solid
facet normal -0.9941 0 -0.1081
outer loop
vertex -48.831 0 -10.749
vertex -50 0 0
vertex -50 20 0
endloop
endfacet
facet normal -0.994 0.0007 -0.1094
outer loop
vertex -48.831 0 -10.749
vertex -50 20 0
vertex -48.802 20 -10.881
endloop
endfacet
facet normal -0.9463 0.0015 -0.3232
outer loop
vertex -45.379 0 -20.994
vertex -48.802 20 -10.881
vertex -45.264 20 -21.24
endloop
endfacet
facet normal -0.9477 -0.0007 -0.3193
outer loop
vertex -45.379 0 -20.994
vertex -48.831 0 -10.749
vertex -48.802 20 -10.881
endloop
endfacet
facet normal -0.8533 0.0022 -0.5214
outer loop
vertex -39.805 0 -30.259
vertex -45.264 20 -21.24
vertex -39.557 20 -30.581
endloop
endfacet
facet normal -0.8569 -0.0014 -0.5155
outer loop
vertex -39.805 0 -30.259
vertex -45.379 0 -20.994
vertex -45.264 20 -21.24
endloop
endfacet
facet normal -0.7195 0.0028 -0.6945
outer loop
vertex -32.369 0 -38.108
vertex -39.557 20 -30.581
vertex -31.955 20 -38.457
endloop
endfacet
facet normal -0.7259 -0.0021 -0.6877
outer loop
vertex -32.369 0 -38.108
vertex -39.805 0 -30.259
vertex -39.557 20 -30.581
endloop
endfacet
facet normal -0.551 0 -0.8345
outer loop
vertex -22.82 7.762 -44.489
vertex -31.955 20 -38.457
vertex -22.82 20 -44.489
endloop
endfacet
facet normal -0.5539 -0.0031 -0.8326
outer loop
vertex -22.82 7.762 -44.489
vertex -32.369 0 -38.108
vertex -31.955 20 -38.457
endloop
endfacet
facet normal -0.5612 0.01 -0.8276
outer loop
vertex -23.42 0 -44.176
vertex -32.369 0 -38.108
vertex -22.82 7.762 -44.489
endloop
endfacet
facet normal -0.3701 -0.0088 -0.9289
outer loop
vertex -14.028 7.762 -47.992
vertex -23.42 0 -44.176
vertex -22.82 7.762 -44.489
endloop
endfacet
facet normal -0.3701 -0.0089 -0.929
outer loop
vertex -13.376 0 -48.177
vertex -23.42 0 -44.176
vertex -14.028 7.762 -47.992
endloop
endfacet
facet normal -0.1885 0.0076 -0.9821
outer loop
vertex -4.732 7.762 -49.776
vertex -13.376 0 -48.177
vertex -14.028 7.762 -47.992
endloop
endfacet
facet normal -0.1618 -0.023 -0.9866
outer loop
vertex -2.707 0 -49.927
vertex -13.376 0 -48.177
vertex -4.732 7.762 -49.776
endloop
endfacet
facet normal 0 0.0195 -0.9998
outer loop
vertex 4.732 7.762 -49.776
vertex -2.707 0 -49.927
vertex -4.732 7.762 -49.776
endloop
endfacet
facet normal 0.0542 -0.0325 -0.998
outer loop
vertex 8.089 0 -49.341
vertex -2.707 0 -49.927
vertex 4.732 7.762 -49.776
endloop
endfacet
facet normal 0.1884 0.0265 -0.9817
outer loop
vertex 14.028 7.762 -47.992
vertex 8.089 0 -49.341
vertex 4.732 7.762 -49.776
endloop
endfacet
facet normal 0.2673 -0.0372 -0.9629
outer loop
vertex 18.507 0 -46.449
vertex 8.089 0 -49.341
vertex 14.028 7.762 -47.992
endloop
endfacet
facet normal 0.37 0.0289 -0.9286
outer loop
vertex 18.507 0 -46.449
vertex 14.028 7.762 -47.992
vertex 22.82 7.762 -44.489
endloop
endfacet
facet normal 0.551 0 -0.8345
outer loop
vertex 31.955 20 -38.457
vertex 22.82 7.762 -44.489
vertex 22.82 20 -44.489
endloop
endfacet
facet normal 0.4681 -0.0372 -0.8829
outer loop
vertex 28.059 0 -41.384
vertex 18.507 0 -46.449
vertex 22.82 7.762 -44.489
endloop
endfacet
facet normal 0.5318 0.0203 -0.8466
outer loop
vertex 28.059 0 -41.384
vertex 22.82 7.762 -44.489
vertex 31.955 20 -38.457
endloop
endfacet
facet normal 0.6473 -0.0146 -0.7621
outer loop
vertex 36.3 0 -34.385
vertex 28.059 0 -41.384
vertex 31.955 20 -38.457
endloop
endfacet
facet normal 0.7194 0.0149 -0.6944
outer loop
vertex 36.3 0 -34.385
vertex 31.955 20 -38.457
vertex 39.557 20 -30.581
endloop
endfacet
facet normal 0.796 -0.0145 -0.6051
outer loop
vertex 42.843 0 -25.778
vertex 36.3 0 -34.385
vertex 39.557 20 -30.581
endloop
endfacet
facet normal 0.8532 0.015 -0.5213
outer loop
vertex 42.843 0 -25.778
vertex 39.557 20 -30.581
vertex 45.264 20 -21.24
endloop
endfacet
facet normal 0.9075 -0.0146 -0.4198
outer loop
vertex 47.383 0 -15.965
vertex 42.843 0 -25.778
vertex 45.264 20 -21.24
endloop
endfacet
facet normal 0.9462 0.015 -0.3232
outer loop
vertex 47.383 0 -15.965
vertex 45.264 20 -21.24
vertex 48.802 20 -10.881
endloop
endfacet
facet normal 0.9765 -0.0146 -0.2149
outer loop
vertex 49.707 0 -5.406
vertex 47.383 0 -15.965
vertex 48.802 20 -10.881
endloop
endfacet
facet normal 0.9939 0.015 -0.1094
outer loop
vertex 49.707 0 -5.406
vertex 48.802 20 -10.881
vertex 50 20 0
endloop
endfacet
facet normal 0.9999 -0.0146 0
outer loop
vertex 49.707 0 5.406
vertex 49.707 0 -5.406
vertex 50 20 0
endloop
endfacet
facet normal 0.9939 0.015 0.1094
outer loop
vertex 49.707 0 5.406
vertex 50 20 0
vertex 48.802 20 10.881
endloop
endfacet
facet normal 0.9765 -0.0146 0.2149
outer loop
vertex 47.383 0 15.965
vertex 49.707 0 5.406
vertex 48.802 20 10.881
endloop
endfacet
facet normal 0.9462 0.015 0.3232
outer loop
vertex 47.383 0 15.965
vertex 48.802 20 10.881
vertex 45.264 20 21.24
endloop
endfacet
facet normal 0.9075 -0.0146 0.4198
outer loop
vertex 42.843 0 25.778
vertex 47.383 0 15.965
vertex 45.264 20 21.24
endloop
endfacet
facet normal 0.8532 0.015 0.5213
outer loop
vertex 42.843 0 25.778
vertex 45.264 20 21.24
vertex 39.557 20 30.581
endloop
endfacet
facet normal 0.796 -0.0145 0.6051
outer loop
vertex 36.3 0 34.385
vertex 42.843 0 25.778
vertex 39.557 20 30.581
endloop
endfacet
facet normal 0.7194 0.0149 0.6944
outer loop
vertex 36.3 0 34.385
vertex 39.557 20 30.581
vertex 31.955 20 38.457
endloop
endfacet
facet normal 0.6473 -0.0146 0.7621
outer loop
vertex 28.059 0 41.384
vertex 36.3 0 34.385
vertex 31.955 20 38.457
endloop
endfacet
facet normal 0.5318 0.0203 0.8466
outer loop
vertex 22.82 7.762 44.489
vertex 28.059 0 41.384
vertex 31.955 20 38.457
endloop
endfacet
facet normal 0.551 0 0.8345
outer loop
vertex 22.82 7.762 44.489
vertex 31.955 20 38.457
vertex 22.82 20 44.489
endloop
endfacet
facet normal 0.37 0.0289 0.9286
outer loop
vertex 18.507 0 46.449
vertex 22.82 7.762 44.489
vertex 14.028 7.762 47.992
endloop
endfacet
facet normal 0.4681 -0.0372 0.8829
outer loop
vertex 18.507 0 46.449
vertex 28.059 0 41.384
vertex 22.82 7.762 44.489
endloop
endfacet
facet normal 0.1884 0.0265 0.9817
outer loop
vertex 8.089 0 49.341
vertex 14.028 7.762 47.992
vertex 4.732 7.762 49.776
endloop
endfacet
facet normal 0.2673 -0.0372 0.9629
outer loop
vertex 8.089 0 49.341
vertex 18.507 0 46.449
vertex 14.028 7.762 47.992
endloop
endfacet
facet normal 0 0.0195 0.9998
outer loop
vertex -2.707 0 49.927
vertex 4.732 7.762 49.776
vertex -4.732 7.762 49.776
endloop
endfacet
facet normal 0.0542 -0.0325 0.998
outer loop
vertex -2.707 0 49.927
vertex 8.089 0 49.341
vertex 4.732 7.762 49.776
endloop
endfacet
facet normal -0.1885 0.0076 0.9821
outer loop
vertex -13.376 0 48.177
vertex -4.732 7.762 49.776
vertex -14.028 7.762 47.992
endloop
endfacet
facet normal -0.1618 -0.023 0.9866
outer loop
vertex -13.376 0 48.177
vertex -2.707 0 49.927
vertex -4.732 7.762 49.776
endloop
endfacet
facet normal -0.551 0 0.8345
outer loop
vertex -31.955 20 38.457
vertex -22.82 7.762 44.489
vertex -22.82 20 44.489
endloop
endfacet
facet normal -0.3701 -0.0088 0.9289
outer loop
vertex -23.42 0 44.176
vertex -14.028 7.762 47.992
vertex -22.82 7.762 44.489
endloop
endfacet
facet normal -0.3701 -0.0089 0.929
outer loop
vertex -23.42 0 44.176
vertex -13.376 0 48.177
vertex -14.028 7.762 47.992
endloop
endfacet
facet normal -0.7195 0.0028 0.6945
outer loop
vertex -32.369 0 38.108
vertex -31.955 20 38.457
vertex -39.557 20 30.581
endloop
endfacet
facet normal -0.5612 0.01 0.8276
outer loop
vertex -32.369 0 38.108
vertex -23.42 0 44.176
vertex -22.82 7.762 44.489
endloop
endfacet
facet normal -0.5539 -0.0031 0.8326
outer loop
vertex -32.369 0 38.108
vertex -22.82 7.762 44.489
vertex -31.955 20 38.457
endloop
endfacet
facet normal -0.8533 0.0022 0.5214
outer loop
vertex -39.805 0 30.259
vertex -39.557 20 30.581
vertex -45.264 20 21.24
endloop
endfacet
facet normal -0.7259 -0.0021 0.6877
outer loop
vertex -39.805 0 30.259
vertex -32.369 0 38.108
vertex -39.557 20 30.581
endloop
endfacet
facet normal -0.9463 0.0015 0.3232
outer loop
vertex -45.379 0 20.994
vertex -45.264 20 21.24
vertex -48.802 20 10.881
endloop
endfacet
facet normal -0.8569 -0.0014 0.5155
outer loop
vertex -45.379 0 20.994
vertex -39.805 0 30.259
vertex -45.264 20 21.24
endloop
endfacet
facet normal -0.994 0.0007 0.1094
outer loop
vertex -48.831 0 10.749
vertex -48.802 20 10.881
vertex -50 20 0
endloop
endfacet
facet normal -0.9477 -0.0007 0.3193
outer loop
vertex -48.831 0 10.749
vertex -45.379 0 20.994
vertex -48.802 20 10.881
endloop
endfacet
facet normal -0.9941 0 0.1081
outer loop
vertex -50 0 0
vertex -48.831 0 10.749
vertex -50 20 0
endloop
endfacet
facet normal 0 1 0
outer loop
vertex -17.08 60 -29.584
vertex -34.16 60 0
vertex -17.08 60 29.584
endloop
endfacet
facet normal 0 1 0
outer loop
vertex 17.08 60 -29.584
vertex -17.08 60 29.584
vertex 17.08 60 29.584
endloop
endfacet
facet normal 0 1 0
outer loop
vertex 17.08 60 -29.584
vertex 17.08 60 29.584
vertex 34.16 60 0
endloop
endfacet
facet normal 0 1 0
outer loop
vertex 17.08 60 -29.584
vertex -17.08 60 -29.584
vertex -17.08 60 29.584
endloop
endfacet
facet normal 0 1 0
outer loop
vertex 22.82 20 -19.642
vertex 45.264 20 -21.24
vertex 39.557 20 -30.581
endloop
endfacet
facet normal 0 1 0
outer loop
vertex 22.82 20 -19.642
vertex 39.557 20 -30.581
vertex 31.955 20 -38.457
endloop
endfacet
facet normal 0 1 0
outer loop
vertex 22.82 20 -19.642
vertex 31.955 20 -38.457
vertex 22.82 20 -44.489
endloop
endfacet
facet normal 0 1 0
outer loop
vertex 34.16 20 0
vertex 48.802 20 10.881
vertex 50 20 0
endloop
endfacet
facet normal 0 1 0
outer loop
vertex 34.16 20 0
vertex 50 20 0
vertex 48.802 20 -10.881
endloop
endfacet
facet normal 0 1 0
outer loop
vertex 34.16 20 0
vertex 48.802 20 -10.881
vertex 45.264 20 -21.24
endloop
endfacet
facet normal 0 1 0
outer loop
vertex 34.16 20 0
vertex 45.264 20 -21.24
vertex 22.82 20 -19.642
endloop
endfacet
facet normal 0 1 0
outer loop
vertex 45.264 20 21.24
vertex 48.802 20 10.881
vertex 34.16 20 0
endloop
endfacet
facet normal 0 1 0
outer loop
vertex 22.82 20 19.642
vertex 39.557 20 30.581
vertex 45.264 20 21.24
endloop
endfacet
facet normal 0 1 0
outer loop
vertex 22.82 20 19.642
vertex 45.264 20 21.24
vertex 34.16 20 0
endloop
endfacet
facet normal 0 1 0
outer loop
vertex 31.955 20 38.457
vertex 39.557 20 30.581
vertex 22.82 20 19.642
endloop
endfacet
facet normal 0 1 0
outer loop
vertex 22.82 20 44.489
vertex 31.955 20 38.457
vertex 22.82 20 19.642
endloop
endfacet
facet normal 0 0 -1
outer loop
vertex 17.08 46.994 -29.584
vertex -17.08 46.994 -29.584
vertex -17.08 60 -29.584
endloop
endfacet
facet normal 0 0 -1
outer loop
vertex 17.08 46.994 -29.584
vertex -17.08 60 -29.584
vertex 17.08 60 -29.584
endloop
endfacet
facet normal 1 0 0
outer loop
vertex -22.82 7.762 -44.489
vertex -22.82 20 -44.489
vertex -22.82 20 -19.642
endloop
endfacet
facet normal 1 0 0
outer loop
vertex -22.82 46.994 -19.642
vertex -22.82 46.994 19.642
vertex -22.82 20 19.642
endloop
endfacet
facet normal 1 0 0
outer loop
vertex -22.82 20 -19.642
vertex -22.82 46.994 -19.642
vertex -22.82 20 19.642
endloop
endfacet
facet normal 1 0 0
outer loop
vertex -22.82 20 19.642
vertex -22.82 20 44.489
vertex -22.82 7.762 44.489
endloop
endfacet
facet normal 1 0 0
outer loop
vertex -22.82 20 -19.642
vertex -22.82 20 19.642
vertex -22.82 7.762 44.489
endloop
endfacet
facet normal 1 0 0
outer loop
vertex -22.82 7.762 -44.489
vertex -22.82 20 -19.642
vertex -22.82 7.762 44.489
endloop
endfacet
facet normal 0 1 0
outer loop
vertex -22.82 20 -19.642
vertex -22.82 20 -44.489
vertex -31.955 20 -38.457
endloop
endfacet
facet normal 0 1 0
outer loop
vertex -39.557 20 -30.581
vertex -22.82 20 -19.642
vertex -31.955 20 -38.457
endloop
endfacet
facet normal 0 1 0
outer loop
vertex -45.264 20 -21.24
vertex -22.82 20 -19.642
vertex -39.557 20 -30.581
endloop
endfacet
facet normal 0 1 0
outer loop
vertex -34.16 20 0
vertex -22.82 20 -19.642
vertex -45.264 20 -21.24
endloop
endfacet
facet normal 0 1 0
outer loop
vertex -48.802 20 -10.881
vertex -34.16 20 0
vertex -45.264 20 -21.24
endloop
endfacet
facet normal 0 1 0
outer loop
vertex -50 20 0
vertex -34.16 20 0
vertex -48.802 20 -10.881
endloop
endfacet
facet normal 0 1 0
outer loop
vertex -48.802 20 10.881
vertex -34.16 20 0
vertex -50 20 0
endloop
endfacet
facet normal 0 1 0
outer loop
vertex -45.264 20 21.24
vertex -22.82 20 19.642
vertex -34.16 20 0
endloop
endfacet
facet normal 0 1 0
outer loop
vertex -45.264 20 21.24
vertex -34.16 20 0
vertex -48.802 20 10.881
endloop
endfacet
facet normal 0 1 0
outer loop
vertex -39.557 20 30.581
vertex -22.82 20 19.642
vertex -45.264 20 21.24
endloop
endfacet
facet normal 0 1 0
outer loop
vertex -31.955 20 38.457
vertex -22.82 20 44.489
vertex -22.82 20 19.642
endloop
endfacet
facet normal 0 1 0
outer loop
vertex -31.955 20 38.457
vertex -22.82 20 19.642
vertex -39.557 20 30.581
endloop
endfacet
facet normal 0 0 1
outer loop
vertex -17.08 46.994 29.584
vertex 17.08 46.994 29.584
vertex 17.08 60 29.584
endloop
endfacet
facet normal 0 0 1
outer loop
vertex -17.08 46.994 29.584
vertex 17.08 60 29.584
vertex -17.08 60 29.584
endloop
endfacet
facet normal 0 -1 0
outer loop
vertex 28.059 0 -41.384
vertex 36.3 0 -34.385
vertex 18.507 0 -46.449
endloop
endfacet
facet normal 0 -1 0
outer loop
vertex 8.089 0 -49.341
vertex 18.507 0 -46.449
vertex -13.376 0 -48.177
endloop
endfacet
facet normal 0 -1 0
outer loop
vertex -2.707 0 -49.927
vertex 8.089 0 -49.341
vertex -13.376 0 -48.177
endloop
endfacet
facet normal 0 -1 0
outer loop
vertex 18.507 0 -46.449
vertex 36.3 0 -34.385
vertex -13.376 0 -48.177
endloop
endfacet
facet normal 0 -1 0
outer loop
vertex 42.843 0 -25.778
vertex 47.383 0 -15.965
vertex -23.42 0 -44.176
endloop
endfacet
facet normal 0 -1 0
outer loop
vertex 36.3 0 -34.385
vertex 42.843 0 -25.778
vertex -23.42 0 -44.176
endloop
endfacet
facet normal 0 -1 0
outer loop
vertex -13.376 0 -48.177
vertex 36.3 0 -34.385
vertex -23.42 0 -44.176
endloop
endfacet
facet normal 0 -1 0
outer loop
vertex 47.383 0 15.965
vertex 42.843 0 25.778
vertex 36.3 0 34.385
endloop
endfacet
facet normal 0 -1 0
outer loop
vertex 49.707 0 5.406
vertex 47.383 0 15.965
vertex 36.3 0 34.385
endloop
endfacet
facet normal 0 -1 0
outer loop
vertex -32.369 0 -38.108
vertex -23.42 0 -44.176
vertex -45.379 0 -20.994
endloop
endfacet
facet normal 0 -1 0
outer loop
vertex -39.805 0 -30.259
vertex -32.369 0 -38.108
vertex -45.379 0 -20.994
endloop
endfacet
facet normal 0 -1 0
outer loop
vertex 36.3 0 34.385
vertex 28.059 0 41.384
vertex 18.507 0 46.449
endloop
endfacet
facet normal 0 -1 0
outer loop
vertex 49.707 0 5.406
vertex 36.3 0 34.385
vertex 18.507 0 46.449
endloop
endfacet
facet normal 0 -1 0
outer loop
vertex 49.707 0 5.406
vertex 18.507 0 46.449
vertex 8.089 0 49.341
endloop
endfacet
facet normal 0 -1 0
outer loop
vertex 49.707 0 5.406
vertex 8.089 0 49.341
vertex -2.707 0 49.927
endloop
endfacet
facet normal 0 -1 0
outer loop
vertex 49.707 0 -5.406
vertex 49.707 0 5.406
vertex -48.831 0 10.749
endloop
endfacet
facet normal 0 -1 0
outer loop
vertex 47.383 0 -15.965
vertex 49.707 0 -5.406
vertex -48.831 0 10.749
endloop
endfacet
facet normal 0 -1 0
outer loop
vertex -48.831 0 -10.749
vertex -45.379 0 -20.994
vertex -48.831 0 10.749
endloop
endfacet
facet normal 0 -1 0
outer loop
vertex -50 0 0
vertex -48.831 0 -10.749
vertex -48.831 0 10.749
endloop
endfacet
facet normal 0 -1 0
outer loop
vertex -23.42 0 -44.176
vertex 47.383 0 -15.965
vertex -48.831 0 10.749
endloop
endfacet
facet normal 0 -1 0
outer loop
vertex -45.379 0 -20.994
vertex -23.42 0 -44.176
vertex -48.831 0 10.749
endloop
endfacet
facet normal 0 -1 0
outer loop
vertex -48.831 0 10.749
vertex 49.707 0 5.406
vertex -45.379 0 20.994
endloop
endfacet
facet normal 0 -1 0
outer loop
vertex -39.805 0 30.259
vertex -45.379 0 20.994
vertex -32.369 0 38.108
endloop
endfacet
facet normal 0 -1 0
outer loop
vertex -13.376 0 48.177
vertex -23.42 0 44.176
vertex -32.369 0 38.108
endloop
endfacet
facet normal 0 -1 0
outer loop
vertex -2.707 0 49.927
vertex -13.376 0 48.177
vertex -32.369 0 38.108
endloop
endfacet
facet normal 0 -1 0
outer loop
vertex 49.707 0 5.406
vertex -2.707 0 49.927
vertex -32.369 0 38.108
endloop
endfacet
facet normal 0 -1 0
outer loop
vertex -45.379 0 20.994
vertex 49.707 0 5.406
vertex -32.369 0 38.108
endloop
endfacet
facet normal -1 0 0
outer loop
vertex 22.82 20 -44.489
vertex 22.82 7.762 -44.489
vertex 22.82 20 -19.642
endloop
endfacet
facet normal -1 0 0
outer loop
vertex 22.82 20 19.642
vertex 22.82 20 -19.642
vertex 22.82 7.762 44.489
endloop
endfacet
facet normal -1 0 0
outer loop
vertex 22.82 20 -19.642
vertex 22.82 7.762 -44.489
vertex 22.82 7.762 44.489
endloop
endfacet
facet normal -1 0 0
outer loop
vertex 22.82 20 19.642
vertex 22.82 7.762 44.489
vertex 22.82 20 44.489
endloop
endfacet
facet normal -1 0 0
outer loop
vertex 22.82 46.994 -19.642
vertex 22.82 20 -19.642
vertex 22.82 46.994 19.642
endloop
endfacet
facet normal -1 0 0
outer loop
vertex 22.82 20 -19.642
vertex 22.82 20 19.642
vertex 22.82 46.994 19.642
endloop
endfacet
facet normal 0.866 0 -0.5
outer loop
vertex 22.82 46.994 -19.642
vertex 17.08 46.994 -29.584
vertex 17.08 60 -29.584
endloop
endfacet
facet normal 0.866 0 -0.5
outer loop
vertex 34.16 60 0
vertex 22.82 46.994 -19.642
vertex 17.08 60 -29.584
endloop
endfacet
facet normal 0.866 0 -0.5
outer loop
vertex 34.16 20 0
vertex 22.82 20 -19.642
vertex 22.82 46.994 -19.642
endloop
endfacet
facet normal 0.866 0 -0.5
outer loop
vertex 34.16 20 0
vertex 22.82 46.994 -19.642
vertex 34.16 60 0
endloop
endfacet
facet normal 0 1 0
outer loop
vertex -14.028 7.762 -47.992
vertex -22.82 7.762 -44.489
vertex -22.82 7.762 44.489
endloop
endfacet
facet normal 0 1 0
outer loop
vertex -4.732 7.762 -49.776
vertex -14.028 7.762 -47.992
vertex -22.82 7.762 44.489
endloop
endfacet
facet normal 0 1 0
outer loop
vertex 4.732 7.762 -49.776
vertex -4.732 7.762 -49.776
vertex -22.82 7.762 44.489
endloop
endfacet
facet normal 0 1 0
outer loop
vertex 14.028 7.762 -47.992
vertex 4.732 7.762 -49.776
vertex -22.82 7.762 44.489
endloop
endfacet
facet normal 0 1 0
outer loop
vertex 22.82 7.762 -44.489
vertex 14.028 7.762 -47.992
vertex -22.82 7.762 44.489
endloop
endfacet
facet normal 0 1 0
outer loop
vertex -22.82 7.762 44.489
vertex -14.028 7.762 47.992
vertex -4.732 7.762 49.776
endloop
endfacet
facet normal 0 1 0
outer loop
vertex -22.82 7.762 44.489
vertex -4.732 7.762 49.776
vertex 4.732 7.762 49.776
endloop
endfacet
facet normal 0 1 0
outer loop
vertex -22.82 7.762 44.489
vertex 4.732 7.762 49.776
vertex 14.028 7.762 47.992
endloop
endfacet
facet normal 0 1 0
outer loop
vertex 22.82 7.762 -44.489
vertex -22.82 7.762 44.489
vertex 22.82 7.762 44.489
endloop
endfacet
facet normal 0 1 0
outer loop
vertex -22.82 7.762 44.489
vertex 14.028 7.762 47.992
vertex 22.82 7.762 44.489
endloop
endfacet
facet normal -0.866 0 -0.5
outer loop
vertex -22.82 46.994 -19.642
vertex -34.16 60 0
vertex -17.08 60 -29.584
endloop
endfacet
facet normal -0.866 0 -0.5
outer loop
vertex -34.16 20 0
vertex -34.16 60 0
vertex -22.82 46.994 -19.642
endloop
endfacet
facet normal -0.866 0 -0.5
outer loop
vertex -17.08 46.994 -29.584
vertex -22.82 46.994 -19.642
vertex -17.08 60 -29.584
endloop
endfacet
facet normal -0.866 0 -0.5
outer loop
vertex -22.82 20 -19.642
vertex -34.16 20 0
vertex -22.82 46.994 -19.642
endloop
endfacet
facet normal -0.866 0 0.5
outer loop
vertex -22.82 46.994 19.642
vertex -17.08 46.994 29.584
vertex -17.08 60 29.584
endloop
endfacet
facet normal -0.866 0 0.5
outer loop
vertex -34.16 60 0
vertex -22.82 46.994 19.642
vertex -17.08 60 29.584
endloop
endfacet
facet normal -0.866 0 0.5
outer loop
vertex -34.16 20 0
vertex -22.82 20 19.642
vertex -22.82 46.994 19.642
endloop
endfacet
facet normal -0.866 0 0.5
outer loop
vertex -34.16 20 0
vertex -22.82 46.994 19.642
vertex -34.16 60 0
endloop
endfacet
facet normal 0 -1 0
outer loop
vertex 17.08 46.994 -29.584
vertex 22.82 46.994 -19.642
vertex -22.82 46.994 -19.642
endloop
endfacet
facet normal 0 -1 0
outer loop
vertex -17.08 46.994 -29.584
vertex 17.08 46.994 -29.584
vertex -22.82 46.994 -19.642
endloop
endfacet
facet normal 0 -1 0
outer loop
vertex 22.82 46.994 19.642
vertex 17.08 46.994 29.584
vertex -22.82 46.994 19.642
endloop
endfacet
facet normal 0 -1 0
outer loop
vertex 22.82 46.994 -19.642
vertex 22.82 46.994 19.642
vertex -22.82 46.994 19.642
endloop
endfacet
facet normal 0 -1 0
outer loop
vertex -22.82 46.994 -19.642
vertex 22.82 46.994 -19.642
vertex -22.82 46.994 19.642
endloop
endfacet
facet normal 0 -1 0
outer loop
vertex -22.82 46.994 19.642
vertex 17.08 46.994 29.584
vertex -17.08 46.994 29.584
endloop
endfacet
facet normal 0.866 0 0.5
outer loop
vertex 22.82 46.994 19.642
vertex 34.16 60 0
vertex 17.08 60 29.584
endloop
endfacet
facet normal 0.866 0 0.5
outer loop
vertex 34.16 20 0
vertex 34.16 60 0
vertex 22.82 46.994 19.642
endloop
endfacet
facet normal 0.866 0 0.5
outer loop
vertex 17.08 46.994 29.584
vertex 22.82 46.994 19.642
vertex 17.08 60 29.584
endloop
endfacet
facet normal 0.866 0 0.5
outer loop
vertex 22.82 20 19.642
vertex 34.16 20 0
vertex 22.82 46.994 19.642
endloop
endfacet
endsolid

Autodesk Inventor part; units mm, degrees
ref_plane "YZ Plane" through (0, 0, 0) normal (1, 0, 0) x (0, 1, 0)
ref_plane "XZ Plane" through (0, 0, 0) normal (0, 1, 0) x (-1, 0, 0)
ref_plane "XY Plane" through (0, 0, 0) normal (0, 0, 1) x (1, 0, 0)
sketch "Эскиз1" plane through (0, 0, 0) normal (0, 1, 0) x (-1, 0, 0)
  circle A0 centre (0, 0) radius 50
  dimension "d0" = 100
extrude "Выдавливание1" add sketch "Эскиз1" along normal blind 20
sketch "Эскиз2" plane through (0, 20, 0) normal (0, 1, 0) x (1, 0, 0)
  line L0 (17.0801, 29.5836) -> (34.1603, 0)
  line L1 (34.1603, 0) -> (17.0801, -29.5836)
  line L2 (17.0801, -29.5836) -> (-17.0801, -29.5836)
  line L3 (-17.0801, -29.5836) -> (-34.1603, 0)
  line L4 (-34.1603, 0) -> (-17.0801, 29.5836)
  line L5 (-17.0801, 29.5836) -> (17.0801, 29.5836)
  point P0 (0, 0)
  point P1 (0, 0)
extrude "Выдавливание2" add sketch "Эскиз2" along normal blind 40
sketch "Эскиз3" plane through (0, 0, 0) normal (0, 0, 1) x (1, 0, 0)
  line L0 (-22.8201, 7.7625) -> (22.8201, 7.7625)
  line L1 (22.8201, 7.7625) -> (22.8201, 46.9937)
  line L2 (22.8201, 46.9937) -> (-22.8201, 46.9937)
  line L3 (-22.8201, 46.9937) -> (-22.8201, 7.7625)
  line L4 (-22.8201, 7.7625) -> (22.8201, 46.9937) construction
  line L5 (22.8201, 7.7625) -> (-22.8201, 46.9937) construction
  point P0 (0, 0)
  point P1 (0, 27.3781)
extrude "Выдавливание3" cut sketch "Эскиз3" against normal through all both and the other way through all
sketch "Эскиз4" plane through (0, 0, 0) normal (1, 0, 0) x (0, 1, 0)
  point P0 (0, 0)
